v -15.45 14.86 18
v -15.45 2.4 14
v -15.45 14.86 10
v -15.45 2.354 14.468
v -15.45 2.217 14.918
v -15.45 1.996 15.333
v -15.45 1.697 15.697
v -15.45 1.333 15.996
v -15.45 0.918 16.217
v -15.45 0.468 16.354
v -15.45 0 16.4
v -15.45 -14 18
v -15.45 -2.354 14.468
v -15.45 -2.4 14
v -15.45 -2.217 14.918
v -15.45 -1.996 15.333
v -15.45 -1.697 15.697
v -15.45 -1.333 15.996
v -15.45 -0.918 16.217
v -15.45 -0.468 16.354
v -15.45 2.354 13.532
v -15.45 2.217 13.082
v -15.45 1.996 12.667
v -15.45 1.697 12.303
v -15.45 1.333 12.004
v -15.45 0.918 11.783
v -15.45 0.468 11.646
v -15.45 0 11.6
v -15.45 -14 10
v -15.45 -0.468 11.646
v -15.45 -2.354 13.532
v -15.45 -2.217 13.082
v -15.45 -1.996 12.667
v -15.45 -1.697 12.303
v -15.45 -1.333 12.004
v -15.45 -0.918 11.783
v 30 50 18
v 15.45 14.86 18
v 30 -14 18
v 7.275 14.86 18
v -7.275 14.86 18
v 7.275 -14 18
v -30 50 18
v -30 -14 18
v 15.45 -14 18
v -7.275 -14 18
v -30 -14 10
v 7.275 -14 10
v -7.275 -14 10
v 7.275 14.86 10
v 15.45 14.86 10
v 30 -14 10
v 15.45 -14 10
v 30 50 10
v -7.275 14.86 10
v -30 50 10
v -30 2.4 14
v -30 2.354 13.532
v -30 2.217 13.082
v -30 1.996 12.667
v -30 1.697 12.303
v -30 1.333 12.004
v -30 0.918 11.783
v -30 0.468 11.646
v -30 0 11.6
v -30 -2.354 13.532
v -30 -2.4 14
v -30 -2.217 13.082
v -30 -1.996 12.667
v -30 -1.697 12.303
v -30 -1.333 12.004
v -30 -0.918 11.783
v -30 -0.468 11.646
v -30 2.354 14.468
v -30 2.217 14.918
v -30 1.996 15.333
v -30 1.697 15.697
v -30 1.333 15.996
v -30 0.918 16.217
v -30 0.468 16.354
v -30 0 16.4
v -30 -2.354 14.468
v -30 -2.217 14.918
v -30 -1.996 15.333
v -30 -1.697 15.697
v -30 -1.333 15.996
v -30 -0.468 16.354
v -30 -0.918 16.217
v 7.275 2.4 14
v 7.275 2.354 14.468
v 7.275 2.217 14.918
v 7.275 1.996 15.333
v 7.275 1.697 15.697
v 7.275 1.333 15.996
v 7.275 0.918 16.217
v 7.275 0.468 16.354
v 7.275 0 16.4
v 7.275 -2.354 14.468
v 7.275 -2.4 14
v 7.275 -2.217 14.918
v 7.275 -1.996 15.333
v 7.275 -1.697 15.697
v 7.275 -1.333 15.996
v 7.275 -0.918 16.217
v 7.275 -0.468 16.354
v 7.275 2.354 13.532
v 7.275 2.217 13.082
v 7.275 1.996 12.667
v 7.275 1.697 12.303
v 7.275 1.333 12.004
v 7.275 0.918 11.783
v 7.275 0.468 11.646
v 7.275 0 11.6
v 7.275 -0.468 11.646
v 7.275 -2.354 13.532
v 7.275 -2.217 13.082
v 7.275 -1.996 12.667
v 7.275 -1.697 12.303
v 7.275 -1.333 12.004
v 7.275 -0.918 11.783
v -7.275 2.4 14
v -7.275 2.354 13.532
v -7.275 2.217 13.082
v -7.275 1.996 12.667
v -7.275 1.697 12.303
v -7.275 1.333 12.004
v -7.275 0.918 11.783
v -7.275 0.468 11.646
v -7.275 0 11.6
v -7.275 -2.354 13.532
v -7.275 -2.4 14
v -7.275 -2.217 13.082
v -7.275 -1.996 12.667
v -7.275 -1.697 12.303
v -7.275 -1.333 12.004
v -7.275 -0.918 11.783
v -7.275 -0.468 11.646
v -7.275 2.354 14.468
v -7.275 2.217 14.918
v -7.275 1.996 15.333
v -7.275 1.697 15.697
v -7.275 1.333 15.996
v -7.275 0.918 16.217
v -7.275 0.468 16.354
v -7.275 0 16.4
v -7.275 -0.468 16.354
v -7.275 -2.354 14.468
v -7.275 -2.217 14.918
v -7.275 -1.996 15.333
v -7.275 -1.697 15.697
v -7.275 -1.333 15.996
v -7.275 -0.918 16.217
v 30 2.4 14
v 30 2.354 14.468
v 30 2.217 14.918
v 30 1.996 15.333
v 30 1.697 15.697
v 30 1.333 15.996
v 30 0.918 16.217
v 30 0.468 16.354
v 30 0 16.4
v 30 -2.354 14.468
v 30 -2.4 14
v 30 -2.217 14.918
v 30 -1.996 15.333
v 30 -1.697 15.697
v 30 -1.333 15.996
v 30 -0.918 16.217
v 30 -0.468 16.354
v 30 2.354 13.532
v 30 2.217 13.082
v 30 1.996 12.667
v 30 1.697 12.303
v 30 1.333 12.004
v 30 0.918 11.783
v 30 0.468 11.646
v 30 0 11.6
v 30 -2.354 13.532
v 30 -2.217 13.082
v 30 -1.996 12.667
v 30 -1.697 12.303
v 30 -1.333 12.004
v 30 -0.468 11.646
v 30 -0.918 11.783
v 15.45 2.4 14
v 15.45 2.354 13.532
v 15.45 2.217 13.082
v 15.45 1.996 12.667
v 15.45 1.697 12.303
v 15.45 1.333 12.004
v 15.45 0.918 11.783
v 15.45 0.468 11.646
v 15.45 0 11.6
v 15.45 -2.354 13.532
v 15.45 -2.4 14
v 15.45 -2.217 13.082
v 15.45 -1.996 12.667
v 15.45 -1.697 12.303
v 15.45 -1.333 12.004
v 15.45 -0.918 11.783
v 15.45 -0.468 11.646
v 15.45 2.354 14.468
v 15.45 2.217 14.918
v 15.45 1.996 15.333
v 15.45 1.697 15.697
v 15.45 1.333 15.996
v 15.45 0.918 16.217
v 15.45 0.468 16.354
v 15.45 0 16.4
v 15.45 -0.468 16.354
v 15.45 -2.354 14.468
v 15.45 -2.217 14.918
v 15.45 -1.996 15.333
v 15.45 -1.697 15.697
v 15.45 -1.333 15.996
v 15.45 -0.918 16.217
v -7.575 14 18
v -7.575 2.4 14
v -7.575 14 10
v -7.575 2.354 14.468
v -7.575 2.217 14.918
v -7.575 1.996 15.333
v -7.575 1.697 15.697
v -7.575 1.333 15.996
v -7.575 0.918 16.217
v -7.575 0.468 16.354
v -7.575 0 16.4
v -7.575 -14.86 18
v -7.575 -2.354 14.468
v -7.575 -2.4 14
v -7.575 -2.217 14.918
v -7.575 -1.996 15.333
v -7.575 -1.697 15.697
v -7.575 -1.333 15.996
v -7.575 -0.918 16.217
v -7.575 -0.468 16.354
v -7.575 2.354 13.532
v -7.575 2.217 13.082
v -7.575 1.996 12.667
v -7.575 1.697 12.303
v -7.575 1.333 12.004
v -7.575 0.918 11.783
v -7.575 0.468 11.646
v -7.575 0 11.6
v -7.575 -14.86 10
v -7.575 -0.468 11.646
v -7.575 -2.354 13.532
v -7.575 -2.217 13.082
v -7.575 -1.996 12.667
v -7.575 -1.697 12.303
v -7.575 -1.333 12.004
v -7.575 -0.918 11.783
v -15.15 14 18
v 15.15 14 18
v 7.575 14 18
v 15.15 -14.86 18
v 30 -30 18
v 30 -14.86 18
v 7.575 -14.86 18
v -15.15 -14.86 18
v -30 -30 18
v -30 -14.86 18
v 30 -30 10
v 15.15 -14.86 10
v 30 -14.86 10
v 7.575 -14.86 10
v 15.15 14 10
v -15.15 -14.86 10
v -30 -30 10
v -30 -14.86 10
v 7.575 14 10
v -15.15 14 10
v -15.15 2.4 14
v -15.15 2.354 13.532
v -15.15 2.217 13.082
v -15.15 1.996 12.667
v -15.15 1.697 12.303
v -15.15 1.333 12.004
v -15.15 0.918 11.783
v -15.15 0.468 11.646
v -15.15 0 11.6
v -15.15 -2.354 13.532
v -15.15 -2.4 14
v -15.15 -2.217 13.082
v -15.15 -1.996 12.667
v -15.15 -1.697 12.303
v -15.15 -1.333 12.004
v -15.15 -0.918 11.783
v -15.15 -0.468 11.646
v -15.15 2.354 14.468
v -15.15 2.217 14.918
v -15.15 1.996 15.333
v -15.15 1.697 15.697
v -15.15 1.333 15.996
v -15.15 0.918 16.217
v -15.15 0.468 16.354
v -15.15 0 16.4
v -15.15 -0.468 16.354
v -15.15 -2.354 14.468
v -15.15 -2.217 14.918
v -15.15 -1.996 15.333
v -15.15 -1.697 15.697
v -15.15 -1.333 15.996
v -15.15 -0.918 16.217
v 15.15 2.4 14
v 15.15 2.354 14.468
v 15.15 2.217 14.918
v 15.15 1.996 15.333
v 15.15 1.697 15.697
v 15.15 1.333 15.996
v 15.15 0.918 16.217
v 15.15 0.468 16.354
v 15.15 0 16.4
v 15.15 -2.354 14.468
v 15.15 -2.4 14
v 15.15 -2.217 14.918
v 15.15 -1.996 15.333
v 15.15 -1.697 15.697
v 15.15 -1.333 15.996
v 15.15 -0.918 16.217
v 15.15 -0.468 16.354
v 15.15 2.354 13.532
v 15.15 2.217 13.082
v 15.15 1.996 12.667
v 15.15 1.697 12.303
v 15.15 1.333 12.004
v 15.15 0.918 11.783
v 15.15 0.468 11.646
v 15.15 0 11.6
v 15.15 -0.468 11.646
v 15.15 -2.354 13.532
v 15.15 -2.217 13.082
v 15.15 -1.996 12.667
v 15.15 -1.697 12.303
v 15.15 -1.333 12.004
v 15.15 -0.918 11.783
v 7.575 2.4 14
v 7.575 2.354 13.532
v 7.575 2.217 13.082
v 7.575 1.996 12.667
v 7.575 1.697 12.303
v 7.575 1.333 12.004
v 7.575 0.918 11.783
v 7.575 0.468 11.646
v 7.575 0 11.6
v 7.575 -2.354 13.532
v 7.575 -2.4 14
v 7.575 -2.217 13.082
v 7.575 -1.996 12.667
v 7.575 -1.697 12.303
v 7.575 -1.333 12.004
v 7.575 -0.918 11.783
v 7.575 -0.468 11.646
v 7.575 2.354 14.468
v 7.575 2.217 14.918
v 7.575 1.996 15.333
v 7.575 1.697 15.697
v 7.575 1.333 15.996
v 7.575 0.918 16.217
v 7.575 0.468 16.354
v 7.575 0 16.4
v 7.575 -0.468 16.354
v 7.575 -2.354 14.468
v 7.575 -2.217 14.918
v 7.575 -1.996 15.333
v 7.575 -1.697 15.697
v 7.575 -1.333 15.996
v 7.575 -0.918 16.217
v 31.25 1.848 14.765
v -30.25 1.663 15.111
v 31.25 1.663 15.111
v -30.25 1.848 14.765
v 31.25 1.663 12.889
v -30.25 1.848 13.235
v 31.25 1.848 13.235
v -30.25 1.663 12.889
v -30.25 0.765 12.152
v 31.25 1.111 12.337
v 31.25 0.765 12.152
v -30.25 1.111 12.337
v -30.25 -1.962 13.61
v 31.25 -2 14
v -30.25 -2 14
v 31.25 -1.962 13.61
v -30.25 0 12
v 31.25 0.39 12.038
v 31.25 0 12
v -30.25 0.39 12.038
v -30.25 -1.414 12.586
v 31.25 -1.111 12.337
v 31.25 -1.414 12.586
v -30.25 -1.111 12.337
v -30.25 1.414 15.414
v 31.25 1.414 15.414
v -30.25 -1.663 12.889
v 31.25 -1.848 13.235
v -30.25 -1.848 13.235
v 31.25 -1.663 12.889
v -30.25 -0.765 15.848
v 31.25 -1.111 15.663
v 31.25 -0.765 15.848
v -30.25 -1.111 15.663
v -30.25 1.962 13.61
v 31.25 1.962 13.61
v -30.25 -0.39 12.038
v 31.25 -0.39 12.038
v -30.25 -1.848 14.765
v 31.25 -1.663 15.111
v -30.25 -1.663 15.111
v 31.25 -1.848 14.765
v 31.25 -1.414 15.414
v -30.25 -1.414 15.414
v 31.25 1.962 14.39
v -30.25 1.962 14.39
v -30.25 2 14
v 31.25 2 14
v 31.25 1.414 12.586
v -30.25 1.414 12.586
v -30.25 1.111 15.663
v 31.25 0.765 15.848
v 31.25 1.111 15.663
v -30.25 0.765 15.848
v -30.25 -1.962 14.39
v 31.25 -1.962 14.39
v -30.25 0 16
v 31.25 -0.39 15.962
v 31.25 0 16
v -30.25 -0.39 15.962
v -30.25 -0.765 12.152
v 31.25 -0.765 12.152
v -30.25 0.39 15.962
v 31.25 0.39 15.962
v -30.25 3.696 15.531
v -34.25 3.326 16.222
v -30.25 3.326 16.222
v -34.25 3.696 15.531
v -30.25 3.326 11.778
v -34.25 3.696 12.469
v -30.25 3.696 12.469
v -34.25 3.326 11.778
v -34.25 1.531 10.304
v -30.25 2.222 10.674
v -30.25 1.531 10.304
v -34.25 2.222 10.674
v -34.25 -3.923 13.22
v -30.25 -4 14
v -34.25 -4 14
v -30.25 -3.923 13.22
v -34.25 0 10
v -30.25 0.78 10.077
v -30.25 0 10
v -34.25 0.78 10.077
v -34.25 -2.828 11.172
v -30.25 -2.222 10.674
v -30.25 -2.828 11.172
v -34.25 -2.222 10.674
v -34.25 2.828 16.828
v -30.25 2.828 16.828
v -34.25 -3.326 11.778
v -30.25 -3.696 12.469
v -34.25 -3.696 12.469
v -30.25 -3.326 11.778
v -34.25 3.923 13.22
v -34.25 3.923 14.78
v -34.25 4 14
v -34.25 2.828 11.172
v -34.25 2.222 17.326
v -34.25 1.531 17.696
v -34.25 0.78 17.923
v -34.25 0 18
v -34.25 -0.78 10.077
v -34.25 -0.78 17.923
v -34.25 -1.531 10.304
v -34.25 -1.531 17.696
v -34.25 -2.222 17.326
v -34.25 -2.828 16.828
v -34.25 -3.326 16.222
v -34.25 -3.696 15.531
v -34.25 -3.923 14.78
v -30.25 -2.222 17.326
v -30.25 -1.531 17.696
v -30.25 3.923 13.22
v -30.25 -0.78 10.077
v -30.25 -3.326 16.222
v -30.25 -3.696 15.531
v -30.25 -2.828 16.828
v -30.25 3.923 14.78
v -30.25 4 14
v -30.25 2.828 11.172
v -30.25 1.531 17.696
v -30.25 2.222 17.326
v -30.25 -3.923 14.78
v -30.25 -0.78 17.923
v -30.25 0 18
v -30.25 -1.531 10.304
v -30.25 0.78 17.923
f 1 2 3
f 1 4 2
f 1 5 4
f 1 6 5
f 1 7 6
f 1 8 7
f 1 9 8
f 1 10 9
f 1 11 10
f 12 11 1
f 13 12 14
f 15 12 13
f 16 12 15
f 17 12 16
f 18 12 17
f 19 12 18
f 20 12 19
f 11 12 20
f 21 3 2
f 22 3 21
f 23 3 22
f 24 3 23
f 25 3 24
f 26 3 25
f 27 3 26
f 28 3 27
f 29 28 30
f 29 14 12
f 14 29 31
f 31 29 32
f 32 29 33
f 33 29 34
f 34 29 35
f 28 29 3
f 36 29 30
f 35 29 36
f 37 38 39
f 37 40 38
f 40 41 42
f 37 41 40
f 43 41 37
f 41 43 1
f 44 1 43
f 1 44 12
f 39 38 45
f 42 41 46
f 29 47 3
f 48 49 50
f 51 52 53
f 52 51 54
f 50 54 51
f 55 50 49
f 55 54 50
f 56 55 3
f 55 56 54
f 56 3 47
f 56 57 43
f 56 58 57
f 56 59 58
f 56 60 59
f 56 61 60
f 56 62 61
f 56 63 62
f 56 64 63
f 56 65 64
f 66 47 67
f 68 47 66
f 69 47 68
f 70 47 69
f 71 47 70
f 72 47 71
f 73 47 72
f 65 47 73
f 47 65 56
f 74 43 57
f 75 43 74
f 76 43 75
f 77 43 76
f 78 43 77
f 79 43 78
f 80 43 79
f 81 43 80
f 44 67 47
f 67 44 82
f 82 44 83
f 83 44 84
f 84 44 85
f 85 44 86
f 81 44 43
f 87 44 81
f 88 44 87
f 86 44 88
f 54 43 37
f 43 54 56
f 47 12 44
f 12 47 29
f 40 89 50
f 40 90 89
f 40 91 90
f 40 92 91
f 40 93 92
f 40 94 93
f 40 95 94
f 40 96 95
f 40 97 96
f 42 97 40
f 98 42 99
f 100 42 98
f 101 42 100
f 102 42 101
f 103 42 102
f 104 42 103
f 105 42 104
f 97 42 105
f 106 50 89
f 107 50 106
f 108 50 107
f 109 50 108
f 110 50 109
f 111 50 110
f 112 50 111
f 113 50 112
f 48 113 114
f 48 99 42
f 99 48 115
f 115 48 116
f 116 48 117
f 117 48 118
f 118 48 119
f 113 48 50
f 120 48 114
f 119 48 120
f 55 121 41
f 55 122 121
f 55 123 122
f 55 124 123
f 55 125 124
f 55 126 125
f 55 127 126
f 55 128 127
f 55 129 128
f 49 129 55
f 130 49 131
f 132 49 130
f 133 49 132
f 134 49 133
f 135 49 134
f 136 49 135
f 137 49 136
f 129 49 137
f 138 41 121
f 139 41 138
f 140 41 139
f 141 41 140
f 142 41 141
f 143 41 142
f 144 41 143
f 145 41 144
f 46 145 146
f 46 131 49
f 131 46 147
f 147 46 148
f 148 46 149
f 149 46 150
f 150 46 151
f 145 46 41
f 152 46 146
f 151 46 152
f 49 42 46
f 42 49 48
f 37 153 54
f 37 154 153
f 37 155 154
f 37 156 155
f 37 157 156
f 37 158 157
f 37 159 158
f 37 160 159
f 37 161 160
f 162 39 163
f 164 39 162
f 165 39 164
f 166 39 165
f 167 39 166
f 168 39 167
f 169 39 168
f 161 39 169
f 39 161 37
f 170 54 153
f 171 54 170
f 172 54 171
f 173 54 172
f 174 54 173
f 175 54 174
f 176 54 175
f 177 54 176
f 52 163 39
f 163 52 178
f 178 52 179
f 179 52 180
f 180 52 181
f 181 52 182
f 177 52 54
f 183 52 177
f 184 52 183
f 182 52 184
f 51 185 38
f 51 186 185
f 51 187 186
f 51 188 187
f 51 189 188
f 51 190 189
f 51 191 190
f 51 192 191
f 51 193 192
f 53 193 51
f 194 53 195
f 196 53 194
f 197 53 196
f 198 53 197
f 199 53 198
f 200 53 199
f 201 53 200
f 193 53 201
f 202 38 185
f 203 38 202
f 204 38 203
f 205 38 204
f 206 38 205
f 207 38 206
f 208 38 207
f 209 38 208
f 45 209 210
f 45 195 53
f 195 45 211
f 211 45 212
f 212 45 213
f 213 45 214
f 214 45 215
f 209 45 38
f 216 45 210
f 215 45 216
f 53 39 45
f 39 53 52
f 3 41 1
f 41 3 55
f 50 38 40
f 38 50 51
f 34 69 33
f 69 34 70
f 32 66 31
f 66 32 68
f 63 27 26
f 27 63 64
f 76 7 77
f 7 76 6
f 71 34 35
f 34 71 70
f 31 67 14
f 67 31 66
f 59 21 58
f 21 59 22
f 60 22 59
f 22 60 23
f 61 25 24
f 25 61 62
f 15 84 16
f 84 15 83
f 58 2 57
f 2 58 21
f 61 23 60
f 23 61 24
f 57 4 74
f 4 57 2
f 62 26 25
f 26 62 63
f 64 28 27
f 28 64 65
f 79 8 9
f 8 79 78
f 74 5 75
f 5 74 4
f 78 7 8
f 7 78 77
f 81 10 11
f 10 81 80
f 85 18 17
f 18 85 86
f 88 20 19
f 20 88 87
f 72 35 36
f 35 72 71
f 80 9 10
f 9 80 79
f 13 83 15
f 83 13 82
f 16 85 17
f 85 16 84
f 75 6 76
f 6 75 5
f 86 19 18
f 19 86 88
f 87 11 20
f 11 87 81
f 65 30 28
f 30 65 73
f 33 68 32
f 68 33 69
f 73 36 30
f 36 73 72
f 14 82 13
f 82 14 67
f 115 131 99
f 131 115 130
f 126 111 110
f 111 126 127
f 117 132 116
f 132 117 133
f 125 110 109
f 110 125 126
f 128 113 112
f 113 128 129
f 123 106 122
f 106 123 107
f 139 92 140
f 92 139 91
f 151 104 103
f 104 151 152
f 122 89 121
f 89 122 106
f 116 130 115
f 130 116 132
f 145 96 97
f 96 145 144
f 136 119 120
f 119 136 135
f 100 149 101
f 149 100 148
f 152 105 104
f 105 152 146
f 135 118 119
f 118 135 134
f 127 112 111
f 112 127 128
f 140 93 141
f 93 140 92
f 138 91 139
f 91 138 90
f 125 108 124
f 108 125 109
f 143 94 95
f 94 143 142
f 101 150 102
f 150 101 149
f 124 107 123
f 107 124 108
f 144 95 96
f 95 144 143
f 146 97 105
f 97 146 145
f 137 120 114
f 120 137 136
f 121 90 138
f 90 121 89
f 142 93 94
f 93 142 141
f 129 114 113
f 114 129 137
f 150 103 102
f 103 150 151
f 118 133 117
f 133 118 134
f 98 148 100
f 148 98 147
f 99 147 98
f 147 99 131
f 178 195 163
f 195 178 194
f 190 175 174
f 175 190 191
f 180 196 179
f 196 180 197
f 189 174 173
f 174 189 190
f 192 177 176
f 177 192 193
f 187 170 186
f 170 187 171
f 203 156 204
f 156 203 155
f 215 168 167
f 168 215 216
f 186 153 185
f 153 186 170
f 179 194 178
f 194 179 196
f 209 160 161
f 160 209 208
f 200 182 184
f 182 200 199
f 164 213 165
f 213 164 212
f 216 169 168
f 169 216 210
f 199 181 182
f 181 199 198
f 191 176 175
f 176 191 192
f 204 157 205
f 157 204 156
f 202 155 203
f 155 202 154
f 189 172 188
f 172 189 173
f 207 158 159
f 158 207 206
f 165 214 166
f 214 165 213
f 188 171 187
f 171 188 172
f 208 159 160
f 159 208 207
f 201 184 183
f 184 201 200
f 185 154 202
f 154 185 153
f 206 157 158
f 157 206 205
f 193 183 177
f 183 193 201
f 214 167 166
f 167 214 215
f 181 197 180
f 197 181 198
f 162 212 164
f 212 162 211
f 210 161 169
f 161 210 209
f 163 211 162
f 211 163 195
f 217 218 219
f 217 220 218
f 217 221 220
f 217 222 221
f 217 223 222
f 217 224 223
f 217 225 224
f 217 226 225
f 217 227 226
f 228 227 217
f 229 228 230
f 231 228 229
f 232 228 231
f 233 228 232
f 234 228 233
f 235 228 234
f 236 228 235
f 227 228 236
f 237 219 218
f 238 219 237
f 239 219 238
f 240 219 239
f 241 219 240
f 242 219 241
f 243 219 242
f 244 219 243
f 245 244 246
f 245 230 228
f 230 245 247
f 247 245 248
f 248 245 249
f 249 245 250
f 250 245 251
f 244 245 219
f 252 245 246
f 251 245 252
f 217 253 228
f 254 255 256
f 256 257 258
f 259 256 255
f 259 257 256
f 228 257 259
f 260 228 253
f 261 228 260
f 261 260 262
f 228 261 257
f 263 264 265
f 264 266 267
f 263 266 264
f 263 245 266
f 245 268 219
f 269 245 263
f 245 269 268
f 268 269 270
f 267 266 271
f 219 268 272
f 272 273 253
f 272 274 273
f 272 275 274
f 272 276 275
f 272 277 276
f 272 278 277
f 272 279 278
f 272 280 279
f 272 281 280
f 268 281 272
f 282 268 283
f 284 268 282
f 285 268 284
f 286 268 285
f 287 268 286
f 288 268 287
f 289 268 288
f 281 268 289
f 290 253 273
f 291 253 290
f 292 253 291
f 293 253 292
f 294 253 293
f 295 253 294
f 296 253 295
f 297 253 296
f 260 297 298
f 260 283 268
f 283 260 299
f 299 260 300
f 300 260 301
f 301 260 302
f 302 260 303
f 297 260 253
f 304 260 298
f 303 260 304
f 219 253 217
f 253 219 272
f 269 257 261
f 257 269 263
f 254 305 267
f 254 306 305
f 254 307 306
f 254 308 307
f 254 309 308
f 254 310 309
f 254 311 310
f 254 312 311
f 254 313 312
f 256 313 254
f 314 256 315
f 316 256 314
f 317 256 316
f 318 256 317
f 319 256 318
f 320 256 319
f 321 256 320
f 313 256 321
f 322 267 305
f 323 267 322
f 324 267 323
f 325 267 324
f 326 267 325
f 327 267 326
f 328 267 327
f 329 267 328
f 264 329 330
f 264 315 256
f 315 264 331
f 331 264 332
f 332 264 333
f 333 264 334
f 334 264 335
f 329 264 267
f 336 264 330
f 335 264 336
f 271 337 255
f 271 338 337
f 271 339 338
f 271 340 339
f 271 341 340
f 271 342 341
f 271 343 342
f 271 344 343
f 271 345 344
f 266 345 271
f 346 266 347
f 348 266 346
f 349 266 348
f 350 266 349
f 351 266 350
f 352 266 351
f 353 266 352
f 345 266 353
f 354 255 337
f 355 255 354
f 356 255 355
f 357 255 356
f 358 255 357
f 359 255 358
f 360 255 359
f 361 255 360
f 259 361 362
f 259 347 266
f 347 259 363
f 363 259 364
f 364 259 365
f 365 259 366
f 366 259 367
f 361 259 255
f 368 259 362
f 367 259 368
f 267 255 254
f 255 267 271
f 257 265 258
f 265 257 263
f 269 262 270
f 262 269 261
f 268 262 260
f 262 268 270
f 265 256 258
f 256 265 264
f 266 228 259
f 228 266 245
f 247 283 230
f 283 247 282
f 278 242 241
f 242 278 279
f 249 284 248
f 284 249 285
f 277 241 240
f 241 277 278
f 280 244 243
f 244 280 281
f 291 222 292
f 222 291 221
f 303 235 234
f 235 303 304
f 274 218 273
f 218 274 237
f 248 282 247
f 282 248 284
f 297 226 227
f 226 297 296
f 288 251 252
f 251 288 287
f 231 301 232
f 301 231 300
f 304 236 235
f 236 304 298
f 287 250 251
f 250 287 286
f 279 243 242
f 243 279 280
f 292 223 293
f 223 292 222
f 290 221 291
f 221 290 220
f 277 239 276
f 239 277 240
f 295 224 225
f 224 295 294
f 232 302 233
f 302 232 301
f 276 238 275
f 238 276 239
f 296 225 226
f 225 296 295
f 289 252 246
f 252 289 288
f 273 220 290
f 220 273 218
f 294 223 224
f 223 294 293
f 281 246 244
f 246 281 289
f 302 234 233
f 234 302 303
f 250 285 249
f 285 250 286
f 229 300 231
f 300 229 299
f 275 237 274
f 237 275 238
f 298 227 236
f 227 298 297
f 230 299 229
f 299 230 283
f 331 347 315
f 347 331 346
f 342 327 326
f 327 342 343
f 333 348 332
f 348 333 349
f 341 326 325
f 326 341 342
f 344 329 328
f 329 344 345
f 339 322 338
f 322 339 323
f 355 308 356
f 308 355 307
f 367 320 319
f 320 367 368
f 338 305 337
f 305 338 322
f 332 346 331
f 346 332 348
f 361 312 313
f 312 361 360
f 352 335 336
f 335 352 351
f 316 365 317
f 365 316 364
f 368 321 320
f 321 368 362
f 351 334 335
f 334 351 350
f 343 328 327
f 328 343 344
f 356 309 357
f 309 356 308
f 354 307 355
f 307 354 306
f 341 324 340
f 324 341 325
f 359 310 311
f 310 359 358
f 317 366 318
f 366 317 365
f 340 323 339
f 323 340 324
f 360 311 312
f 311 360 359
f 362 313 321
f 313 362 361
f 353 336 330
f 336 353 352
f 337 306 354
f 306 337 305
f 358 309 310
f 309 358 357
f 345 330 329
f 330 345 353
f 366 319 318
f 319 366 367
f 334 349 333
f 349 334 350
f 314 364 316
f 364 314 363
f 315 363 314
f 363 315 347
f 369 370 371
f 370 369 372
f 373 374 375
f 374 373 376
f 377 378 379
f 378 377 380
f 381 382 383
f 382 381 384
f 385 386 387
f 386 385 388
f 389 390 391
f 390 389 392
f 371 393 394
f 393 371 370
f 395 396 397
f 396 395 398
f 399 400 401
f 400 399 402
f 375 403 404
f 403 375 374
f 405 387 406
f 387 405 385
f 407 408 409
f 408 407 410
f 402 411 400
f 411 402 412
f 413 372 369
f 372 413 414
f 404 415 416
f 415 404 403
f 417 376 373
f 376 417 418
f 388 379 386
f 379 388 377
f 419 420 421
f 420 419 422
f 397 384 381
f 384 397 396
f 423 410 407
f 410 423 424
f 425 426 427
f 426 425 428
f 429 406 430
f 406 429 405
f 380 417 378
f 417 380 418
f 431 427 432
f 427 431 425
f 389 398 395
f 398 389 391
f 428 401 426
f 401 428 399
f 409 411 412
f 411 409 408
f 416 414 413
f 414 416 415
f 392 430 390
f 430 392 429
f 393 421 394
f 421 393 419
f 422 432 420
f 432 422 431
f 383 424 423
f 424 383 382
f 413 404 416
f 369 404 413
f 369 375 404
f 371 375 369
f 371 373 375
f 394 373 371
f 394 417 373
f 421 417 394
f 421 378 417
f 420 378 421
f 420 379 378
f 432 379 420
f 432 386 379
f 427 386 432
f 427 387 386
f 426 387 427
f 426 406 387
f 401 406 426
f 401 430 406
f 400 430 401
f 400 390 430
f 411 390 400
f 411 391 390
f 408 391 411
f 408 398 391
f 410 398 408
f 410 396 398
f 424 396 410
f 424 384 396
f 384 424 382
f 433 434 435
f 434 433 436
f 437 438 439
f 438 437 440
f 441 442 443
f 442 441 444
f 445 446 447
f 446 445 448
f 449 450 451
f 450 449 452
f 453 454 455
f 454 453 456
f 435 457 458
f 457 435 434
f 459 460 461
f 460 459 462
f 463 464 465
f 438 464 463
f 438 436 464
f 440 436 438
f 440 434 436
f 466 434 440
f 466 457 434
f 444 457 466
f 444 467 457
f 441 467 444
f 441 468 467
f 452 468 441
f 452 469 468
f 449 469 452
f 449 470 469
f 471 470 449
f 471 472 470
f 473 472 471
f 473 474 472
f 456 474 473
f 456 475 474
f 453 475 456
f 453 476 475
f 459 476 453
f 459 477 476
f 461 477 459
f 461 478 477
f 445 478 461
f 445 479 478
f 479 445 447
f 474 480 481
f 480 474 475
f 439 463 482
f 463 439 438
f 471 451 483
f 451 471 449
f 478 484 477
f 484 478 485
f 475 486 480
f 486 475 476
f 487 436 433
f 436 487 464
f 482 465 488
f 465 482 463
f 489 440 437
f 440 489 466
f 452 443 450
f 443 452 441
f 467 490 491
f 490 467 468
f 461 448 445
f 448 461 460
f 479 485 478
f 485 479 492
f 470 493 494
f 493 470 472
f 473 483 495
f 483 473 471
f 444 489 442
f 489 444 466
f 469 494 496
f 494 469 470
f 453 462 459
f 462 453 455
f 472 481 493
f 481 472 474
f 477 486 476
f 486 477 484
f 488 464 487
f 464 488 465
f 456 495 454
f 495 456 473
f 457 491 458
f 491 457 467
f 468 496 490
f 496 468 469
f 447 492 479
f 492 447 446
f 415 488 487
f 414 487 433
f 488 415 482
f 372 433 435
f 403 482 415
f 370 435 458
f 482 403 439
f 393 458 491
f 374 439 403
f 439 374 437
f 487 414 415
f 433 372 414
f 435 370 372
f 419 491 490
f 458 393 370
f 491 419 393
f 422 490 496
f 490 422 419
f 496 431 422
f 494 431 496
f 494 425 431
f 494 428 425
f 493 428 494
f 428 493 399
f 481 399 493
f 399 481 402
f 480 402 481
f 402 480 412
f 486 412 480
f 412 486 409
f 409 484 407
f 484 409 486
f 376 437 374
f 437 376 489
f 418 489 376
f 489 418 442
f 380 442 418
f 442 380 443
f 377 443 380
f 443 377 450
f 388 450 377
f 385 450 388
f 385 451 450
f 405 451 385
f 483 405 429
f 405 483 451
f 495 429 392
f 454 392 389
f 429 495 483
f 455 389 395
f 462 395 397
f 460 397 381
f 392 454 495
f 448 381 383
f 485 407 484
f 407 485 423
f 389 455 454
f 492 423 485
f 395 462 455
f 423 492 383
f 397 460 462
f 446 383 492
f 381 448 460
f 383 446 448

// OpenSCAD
$fn = 32;

// ------------------------------------------------------------------------
// Butt hinge: hinge 60 mm, leaf swung 0 deg
// Every part is its own module, assembly() places every instance.
// ------------------------------------------------------------------------

// --- part 1 ---
module hinge_base() {
  difference() {
    union() {
      translate([-30, -14, -4]) cube([14.55, 64, 8]);
      translate([-7.275, -14, -4]) cube([14.55, 64, 8]);
      translate([15.45, -14, -4]) cube([14.55, 64, 8]);
      translate([-30, 14.86, -4]) cube([60, 35.14, 8]);
    }
    translate([-22.725, 0, 0]) rotate([0, 90, 0]) cylinder(h = 16.55, d = 4.8, center = true);
    translate([0, 0, 0]) rotate([0, 90, 0]) cylinder(h = 16.55, d = 4.8, center = true);
    translate([22.725, 0, 0]) rotate([0, 90, 0]) cylinder(h = 16.55, d = 4.8, center = true);
  }
}

// --- part 2 ---
module hinge_mover() {
  difference() {
    union() {
      translate([-15.15, -30, -4]) cube([7.575, 44, 8]);
      translate([7.575, -30, -4]) cube([7.575, 44, 8]);
      translate([-30, -30, -4]) cube([60, 15.14, 8]);
    }
    translate([-11.362, 0, 0]) rotate([0, 90, 0]) cylinder(h = 9.575, d = 4.8, center = true);
    translate([11.362, 0, 0]) rotate([0, 90, 0]) cylinder(h = 9.575, d = 4.8, center = true);
  }
}

// --- part 3 ---
module hinge_pin() {
  rotate([0, 90, 0]) cylinder(h = 62.5, d = 4, center = true);
  translate([-34.25, 0, 0]) rotate([0, 90, 0]) cylinder(h = 4, d = 8);
}

// --- assembly ---
module assembly() {
  color([0.80, 0.24, 0.20]) translate([0, 0, 14]) rotate([0, 0, 0]) hinge_base();
  color([0.20, 0.45, 0.75]) translate([0, 0, 14]) rotate([0, 0, 0]) hinge_mover();
  color([0.25, 0.62, 0.32]) translate([0, 0, 14]) rotate([0, 0, 0]) hinge_pin();
}

assembly();
